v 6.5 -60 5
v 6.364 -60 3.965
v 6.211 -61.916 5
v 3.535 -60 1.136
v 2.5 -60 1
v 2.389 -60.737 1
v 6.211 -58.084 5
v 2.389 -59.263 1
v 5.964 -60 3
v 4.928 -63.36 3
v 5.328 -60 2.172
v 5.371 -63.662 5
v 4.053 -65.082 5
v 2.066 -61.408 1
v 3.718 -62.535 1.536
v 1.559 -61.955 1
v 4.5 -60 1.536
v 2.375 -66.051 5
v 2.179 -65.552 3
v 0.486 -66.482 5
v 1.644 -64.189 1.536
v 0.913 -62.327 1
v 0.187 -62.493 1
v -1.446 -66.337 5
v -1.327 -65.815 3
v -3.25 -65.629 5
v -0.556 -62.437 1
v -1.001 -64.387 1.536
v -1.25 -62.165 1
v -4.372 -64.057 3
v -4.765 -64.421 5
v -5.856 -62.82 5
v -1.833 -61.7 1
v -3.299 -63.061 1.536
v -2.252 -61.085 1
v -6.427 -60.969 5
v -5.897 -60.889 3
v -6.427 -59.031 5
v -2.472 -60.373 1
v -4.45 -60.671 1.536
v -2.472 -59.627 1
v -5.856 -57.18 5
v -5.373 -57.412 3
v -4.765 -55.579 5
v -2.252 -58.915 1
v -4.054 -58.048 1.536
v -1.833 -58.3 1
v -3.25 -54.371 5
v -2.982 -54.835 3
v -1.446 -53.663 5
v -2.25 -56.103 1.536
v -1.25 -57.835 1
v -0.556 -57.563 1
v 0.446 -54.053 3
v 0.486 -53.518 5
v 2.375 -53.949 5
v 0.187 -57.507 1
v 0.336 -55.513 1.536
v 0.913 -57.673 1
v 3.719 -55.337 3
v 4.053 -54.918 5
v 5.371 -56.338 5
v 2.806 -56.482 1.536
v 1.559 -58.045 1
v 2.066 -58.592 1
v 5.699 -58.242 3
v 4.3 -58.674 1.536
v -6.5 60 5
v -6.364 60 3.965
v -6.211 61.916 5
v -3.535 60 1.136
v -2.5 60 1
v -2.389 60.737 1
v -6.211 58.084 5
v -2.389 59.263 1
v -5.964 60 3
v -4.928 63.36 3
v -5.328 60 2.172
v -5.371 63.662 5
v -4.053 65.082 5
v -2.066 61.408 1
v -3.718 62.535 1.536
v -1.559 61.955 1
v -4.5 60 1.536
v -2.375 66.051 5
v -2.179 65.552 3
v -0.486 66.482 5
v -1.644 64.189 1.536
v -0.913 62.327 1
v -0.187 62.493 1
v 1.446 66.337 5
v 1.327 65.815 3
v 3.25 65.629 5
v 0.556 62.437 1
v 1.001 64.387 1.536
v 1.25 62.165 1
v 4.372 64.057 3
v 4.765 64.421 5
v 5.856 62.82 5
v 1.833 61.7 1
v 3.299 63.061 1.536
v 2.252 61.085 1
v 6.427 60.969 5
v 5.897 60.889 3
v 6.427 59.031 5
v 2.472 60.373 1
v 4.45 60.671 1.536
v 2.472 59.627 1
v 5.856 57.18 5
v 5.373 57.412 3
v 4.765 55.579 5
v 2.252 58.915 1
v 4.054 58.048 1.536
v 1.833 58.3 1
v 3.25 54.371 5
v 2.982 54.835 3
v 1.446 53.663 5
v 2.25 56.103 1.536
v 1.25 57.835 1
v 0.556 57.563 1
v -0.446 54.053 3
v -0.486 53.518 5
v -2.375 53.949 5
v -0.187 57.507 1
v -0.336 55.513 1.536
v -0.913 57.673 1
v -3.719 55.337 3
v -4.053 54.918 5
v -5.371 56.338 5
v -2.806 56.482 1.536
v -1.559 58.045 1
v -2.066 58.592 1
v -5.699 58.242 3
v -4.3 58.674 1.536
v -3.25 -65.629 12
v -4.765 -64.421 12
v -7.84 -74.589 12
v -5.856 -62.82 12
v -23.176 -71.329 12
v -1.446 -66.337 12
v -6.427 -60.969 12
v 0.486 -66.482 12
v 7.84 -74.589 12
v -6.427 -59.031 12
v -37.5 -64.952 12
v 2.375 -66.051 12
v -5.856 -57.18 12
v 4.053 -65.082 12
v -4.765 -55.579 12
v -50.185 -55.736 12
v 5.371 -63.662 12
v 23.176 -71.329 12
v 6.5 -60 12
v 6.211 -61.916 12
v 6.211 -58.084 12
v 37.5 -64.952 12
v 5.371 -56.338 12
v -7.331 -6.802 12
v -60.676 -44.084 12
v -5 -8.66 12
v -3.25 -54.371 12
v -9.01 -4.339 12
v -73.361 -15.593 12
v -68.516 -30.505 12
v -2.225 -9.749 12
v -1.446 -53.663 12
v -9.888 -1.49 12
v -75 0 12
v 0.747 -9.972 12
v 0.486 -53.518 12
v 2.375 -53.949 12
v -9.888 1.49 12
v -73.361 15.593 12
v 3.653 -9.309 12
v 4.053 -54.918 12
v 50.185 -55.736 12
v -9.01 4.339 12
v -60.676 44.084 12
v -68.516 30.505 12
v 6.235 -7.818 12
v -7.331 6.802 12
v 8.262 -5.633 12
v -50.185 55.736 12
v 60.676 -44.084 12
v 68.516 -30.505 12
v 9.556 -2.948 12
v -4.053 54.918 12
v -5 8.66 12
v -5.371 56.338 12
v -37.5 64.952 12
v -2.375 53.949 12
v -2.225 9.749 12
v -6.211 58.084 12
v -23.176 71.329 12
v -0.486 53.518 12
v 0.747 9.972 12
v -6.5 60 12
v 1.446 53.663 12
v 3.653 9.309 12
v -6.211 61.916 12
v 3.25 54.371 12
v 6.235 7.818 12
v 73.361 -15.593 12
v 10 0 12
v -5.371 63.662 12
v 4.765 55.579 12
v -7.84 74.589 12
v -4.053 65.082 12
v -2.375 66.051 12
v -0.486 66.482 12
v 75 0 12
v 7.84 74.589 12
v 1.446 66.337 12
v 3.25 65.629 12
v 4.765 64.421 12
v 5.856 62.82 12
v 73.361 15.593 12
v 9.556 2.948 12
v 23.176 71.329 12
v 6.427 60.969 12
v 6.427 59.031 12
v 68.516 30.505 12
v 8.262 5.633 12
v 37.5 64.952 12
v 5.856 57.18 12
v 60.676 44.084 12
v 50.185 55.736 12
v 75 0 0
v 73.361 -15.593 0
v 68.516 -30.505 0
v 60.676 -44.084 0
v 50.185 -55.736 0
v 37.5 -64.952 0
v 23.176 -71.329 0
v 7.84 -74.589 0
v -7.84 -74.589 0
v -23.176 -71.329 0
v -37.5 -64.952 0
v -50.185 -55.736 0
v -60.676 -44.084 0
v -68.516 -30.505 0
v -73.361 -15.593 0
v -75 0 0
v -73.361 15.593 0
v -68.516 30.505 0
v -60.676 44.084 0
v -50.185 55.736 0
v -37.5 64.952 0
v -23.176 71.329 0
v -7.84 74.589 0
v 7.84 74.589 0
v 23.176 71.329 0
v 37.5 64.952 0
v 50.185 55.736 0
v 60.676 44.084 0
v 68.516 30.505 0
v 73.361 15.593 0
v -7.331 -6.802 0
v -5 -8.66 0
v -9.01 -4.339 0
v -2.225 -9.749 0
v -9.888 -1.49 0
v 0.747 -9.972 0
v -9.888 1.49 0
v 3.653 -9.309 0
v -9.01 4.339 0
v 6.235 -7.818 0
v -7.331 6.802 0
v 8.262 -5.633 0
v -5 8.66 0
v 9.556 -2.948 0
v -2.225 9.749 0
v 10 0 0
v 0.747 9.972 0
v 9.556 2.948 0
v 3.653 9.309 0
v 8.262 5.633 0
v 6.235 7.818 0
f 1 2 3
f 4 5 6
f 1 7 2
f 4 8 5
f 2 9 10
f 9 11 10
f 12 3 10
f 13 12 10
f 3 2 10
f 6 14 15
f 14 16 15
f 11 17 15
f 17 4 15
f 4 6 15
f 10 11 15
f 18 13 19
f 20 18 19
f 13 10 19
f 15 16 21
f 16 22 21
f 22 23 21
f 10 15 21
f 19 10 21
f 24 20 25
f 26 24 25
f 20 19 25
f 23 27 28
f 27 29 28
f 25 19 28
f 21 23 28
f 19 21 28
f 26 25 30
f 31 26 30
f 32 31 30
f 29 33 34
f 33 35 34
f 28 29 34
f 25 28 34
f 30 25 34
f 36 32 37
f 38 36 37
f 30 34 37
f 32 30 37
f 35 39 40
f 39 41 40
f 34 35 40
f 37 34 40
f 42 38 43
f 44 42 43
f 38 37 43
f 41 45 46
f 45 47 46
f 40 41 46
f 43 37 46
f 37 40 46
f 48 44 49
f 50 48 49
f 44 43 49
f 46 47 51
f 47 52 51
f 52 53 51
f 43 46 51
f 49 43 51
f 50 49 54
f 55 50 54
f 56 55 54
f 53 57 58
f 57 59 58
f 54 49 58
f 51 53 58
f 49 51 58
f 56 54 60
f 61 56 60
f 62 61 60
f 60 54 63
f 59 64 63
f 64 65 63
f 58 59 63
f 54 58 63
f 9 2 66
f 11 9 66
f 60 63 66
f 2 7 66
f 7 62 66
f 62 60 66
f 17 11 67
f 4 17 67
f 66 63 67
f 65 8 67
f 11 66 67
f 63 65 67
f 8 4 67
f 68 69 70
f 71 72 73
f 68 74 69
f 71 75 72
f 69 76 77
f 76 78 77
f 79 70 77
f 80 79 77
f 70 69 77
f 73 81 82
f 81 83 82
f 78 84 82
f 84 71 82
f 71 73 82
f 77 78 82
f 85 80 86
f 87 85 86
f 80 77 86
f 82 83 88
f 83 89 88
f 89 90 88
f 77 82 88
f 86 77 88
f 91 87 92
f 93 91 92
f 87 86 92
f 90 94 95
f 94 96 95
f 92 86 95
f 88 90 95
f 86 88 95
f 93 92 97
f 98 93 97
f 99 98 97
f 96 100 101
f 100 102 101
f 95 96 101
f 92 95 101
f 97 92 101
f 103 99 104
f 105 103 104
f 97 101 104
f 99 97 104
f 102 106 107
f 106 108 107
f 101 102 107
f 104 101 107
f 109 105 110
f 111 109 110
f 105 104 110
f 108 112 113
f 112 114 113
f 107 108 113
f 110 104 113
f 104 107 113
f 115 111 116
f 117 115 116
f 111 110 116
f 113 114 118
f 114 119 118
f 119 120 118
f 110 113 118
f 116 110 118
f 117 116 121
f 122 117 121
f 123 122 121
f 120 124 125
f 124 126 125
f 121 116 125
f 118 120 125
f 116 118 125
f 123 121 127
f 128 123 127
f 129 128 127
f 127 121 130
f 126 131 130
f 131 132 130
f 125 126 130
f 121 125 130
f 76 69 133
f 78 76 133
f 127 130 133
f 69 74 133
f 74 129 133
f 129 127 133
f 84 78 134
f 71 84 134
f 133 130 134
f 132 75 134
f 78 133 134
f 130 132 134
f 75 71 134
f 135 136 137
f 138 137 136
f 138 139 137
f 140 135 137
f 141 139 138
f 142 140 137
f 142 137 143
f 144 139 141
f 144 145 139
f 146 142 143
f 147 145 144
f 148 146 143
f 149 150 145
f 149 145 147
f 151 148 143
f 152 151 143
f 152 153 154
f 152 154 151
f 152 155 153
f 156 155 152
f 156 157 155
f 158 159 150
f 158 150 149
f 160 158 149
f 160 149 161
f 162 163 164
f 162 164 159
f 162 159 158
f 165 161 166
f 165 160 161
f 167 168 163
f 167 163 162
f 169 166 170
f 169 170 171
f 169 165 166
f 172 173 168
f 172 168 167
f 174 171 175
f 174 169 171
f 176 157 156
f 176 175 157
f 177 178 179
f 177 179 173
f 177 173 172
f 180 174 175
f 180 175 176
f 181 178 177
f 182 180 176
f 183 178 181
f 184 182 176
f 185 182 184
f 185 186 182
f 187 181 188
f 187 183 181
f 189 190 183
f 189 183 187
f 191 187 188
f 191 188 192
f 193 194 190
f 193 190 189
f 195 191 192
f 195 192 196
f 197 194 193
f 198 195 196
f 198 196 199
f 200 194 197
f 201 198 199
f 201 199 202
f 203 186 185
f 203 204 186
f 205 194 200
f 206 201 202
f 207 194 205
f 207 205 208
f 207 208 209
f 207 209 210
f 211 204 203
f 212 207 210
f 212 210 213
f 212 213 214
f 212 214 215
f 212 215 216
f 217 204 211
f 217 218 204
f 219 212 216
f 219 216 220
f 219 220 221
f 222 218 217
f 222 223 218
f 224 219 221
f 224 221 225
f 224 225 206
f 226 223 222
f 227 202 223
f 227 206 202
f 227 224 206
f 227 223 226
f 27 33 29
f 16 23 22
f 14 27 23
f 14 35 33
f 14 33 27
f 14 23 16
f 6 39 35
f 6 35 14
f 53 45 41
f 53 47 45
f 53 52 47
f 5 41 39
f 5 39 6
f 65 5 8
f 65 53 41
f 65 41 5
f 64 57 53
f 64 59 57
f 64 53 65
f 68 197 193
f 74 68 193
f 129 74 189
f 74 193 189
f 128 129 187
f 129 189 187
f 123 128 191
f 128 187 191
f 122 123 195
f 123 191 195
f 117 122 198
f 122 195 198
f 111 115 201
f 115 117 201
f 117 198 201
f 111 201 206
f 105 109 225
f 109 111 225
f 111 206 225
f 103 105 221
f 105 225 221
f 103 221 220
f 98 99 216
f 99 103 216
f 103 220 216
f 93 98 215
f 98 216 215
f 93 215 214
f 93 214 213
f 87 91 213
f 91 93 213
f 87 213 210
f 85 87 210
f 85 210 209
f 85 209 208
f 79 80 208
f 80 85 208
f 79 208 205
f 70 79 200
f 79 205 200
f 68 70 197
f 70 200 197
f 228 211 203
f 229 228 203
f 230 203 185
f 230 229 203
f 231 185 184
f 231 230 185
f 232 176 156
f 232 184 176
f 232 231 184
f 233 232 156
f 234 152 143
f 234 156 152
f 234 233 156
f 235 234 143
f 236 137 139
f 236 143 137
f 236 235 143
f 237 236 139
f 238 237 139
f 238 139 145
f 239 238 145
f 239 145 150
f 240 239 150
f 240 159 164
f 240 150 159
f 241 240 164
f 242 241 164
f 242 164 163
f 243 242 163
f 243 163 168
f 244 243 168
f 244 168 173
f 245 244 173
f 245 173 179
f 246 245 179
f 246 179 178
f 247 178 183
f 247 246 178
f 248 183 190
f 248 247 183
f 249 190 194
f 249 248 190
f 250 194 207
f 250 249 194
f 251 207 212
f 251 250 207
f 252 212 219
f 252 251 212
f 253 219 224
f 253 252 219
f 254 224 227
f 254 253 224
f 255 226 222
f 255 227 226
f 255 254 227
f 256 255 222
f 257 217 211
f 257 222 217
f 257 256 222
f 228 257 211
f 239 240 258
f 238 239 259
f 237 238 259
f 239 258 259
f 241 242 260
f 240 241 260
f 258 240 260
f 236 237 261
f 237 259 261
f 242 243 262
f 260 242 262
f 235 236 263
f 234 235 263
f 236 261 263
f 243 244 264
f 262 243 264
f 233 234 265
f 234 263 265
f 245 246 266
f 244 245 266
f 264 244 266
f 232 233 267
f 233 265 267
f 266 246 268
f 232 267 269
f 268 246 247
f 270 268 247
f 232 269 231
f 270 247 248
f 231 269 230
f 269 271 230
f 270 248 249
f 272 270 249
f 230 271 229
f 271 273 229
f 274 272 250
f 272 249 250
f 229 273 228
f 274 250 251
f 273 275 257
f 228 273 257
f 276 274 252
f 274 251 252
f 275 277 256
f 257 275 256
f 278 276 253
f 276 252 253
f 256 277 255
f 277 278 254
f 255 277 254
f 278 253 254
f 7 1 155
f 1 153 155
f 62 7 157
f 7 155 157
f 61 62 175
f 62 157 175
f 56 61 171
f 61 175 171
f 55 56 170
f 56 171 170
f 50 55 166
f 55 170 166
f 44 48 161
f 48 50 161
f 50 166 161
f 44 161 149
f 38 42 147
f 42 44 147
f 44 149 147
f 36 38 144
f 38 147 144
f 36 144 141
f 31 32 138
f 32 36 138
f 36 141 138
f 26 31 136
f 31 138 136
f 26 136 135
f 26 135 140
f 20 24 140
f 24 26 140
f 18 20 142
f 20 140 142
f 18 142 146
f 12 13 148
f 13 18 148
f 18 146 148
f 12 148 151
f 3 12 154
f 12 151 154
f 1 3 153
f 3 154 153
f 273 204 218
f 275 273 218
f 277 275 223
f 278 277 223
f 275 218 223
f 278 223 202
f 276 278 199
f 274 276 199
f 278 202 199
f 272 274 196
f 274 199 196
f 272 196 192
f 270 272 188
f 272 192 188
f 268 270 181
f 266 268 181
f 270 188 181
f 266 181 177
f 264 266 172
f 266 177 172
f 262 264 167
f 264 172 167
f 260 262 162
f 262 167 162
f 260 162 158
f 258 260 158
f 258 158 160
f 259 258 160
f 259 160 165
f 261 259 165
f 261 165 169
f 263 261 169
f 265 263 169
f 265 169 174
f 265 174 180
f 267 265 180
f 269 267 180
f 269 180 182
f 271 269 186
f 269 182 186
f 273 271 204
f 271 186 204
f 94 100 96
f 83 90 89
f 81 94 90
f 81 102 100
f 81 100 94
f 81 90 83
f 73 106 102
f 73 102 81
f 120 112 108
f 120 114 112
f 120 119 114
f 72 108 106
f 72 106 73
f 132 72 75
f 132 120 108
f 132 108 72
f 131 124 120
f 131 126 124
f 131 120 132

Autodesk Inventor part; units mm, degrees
ref_plane "YZ Plane" through (0, 0, 0) normal (1, 0, 0) x (0, 1, 0)
ref_plane "XZ Plane" through (0, 0, 0) normal (0, 1, 0) x (-1, 0, 0)
ref_plane "XY Plane" through (0, 0, 0) normal (0, 0, 1) x (1, 0, 0)
sketch "草圖1" plane through (0, 0, 0) normal (0, 0, 1) x (1, 0, 0)
  circle A0 centre (0, 0) radius 75
  dimension "d0" = 150
extrude "擠出1" add sketch "草圖1" along normal blind 12
sketch "草圖2" plane through (0, 0, 12) normal (0, 0, 1) x (1, 0, 0)
  circle A0 centre (0, 0) radius 75 projected
  line L0 (0, 0) -> (0, -60)
  circle A1 centre (0, -60) radius 6.5
  dimension "d3" = 60
  dimension "d4" = 13
extrude "擠出2" cut sketch "草圖2" against normal blind 11 contours A1
fillet "圓角1" radius 4 1 edges at (-6.5, -60, 1)
pattern_circular "環形陣列1" count 2 over 360 about axis through (0, 0, 0) along (0, 0, 1) of "擠出2", "圓角1"
sketch "草圖3" plane through (0, 0, 12) normal (0, 0, 1) x (1, 0, 0)
  circle A0 centre (0, 0) radius 75 projected
  circle A1 centre (0, 0) radius 10
  dimension "d11" = 20
extrude "擠出3" cut sketch "草圖3" against normal blind 12 contours A1
